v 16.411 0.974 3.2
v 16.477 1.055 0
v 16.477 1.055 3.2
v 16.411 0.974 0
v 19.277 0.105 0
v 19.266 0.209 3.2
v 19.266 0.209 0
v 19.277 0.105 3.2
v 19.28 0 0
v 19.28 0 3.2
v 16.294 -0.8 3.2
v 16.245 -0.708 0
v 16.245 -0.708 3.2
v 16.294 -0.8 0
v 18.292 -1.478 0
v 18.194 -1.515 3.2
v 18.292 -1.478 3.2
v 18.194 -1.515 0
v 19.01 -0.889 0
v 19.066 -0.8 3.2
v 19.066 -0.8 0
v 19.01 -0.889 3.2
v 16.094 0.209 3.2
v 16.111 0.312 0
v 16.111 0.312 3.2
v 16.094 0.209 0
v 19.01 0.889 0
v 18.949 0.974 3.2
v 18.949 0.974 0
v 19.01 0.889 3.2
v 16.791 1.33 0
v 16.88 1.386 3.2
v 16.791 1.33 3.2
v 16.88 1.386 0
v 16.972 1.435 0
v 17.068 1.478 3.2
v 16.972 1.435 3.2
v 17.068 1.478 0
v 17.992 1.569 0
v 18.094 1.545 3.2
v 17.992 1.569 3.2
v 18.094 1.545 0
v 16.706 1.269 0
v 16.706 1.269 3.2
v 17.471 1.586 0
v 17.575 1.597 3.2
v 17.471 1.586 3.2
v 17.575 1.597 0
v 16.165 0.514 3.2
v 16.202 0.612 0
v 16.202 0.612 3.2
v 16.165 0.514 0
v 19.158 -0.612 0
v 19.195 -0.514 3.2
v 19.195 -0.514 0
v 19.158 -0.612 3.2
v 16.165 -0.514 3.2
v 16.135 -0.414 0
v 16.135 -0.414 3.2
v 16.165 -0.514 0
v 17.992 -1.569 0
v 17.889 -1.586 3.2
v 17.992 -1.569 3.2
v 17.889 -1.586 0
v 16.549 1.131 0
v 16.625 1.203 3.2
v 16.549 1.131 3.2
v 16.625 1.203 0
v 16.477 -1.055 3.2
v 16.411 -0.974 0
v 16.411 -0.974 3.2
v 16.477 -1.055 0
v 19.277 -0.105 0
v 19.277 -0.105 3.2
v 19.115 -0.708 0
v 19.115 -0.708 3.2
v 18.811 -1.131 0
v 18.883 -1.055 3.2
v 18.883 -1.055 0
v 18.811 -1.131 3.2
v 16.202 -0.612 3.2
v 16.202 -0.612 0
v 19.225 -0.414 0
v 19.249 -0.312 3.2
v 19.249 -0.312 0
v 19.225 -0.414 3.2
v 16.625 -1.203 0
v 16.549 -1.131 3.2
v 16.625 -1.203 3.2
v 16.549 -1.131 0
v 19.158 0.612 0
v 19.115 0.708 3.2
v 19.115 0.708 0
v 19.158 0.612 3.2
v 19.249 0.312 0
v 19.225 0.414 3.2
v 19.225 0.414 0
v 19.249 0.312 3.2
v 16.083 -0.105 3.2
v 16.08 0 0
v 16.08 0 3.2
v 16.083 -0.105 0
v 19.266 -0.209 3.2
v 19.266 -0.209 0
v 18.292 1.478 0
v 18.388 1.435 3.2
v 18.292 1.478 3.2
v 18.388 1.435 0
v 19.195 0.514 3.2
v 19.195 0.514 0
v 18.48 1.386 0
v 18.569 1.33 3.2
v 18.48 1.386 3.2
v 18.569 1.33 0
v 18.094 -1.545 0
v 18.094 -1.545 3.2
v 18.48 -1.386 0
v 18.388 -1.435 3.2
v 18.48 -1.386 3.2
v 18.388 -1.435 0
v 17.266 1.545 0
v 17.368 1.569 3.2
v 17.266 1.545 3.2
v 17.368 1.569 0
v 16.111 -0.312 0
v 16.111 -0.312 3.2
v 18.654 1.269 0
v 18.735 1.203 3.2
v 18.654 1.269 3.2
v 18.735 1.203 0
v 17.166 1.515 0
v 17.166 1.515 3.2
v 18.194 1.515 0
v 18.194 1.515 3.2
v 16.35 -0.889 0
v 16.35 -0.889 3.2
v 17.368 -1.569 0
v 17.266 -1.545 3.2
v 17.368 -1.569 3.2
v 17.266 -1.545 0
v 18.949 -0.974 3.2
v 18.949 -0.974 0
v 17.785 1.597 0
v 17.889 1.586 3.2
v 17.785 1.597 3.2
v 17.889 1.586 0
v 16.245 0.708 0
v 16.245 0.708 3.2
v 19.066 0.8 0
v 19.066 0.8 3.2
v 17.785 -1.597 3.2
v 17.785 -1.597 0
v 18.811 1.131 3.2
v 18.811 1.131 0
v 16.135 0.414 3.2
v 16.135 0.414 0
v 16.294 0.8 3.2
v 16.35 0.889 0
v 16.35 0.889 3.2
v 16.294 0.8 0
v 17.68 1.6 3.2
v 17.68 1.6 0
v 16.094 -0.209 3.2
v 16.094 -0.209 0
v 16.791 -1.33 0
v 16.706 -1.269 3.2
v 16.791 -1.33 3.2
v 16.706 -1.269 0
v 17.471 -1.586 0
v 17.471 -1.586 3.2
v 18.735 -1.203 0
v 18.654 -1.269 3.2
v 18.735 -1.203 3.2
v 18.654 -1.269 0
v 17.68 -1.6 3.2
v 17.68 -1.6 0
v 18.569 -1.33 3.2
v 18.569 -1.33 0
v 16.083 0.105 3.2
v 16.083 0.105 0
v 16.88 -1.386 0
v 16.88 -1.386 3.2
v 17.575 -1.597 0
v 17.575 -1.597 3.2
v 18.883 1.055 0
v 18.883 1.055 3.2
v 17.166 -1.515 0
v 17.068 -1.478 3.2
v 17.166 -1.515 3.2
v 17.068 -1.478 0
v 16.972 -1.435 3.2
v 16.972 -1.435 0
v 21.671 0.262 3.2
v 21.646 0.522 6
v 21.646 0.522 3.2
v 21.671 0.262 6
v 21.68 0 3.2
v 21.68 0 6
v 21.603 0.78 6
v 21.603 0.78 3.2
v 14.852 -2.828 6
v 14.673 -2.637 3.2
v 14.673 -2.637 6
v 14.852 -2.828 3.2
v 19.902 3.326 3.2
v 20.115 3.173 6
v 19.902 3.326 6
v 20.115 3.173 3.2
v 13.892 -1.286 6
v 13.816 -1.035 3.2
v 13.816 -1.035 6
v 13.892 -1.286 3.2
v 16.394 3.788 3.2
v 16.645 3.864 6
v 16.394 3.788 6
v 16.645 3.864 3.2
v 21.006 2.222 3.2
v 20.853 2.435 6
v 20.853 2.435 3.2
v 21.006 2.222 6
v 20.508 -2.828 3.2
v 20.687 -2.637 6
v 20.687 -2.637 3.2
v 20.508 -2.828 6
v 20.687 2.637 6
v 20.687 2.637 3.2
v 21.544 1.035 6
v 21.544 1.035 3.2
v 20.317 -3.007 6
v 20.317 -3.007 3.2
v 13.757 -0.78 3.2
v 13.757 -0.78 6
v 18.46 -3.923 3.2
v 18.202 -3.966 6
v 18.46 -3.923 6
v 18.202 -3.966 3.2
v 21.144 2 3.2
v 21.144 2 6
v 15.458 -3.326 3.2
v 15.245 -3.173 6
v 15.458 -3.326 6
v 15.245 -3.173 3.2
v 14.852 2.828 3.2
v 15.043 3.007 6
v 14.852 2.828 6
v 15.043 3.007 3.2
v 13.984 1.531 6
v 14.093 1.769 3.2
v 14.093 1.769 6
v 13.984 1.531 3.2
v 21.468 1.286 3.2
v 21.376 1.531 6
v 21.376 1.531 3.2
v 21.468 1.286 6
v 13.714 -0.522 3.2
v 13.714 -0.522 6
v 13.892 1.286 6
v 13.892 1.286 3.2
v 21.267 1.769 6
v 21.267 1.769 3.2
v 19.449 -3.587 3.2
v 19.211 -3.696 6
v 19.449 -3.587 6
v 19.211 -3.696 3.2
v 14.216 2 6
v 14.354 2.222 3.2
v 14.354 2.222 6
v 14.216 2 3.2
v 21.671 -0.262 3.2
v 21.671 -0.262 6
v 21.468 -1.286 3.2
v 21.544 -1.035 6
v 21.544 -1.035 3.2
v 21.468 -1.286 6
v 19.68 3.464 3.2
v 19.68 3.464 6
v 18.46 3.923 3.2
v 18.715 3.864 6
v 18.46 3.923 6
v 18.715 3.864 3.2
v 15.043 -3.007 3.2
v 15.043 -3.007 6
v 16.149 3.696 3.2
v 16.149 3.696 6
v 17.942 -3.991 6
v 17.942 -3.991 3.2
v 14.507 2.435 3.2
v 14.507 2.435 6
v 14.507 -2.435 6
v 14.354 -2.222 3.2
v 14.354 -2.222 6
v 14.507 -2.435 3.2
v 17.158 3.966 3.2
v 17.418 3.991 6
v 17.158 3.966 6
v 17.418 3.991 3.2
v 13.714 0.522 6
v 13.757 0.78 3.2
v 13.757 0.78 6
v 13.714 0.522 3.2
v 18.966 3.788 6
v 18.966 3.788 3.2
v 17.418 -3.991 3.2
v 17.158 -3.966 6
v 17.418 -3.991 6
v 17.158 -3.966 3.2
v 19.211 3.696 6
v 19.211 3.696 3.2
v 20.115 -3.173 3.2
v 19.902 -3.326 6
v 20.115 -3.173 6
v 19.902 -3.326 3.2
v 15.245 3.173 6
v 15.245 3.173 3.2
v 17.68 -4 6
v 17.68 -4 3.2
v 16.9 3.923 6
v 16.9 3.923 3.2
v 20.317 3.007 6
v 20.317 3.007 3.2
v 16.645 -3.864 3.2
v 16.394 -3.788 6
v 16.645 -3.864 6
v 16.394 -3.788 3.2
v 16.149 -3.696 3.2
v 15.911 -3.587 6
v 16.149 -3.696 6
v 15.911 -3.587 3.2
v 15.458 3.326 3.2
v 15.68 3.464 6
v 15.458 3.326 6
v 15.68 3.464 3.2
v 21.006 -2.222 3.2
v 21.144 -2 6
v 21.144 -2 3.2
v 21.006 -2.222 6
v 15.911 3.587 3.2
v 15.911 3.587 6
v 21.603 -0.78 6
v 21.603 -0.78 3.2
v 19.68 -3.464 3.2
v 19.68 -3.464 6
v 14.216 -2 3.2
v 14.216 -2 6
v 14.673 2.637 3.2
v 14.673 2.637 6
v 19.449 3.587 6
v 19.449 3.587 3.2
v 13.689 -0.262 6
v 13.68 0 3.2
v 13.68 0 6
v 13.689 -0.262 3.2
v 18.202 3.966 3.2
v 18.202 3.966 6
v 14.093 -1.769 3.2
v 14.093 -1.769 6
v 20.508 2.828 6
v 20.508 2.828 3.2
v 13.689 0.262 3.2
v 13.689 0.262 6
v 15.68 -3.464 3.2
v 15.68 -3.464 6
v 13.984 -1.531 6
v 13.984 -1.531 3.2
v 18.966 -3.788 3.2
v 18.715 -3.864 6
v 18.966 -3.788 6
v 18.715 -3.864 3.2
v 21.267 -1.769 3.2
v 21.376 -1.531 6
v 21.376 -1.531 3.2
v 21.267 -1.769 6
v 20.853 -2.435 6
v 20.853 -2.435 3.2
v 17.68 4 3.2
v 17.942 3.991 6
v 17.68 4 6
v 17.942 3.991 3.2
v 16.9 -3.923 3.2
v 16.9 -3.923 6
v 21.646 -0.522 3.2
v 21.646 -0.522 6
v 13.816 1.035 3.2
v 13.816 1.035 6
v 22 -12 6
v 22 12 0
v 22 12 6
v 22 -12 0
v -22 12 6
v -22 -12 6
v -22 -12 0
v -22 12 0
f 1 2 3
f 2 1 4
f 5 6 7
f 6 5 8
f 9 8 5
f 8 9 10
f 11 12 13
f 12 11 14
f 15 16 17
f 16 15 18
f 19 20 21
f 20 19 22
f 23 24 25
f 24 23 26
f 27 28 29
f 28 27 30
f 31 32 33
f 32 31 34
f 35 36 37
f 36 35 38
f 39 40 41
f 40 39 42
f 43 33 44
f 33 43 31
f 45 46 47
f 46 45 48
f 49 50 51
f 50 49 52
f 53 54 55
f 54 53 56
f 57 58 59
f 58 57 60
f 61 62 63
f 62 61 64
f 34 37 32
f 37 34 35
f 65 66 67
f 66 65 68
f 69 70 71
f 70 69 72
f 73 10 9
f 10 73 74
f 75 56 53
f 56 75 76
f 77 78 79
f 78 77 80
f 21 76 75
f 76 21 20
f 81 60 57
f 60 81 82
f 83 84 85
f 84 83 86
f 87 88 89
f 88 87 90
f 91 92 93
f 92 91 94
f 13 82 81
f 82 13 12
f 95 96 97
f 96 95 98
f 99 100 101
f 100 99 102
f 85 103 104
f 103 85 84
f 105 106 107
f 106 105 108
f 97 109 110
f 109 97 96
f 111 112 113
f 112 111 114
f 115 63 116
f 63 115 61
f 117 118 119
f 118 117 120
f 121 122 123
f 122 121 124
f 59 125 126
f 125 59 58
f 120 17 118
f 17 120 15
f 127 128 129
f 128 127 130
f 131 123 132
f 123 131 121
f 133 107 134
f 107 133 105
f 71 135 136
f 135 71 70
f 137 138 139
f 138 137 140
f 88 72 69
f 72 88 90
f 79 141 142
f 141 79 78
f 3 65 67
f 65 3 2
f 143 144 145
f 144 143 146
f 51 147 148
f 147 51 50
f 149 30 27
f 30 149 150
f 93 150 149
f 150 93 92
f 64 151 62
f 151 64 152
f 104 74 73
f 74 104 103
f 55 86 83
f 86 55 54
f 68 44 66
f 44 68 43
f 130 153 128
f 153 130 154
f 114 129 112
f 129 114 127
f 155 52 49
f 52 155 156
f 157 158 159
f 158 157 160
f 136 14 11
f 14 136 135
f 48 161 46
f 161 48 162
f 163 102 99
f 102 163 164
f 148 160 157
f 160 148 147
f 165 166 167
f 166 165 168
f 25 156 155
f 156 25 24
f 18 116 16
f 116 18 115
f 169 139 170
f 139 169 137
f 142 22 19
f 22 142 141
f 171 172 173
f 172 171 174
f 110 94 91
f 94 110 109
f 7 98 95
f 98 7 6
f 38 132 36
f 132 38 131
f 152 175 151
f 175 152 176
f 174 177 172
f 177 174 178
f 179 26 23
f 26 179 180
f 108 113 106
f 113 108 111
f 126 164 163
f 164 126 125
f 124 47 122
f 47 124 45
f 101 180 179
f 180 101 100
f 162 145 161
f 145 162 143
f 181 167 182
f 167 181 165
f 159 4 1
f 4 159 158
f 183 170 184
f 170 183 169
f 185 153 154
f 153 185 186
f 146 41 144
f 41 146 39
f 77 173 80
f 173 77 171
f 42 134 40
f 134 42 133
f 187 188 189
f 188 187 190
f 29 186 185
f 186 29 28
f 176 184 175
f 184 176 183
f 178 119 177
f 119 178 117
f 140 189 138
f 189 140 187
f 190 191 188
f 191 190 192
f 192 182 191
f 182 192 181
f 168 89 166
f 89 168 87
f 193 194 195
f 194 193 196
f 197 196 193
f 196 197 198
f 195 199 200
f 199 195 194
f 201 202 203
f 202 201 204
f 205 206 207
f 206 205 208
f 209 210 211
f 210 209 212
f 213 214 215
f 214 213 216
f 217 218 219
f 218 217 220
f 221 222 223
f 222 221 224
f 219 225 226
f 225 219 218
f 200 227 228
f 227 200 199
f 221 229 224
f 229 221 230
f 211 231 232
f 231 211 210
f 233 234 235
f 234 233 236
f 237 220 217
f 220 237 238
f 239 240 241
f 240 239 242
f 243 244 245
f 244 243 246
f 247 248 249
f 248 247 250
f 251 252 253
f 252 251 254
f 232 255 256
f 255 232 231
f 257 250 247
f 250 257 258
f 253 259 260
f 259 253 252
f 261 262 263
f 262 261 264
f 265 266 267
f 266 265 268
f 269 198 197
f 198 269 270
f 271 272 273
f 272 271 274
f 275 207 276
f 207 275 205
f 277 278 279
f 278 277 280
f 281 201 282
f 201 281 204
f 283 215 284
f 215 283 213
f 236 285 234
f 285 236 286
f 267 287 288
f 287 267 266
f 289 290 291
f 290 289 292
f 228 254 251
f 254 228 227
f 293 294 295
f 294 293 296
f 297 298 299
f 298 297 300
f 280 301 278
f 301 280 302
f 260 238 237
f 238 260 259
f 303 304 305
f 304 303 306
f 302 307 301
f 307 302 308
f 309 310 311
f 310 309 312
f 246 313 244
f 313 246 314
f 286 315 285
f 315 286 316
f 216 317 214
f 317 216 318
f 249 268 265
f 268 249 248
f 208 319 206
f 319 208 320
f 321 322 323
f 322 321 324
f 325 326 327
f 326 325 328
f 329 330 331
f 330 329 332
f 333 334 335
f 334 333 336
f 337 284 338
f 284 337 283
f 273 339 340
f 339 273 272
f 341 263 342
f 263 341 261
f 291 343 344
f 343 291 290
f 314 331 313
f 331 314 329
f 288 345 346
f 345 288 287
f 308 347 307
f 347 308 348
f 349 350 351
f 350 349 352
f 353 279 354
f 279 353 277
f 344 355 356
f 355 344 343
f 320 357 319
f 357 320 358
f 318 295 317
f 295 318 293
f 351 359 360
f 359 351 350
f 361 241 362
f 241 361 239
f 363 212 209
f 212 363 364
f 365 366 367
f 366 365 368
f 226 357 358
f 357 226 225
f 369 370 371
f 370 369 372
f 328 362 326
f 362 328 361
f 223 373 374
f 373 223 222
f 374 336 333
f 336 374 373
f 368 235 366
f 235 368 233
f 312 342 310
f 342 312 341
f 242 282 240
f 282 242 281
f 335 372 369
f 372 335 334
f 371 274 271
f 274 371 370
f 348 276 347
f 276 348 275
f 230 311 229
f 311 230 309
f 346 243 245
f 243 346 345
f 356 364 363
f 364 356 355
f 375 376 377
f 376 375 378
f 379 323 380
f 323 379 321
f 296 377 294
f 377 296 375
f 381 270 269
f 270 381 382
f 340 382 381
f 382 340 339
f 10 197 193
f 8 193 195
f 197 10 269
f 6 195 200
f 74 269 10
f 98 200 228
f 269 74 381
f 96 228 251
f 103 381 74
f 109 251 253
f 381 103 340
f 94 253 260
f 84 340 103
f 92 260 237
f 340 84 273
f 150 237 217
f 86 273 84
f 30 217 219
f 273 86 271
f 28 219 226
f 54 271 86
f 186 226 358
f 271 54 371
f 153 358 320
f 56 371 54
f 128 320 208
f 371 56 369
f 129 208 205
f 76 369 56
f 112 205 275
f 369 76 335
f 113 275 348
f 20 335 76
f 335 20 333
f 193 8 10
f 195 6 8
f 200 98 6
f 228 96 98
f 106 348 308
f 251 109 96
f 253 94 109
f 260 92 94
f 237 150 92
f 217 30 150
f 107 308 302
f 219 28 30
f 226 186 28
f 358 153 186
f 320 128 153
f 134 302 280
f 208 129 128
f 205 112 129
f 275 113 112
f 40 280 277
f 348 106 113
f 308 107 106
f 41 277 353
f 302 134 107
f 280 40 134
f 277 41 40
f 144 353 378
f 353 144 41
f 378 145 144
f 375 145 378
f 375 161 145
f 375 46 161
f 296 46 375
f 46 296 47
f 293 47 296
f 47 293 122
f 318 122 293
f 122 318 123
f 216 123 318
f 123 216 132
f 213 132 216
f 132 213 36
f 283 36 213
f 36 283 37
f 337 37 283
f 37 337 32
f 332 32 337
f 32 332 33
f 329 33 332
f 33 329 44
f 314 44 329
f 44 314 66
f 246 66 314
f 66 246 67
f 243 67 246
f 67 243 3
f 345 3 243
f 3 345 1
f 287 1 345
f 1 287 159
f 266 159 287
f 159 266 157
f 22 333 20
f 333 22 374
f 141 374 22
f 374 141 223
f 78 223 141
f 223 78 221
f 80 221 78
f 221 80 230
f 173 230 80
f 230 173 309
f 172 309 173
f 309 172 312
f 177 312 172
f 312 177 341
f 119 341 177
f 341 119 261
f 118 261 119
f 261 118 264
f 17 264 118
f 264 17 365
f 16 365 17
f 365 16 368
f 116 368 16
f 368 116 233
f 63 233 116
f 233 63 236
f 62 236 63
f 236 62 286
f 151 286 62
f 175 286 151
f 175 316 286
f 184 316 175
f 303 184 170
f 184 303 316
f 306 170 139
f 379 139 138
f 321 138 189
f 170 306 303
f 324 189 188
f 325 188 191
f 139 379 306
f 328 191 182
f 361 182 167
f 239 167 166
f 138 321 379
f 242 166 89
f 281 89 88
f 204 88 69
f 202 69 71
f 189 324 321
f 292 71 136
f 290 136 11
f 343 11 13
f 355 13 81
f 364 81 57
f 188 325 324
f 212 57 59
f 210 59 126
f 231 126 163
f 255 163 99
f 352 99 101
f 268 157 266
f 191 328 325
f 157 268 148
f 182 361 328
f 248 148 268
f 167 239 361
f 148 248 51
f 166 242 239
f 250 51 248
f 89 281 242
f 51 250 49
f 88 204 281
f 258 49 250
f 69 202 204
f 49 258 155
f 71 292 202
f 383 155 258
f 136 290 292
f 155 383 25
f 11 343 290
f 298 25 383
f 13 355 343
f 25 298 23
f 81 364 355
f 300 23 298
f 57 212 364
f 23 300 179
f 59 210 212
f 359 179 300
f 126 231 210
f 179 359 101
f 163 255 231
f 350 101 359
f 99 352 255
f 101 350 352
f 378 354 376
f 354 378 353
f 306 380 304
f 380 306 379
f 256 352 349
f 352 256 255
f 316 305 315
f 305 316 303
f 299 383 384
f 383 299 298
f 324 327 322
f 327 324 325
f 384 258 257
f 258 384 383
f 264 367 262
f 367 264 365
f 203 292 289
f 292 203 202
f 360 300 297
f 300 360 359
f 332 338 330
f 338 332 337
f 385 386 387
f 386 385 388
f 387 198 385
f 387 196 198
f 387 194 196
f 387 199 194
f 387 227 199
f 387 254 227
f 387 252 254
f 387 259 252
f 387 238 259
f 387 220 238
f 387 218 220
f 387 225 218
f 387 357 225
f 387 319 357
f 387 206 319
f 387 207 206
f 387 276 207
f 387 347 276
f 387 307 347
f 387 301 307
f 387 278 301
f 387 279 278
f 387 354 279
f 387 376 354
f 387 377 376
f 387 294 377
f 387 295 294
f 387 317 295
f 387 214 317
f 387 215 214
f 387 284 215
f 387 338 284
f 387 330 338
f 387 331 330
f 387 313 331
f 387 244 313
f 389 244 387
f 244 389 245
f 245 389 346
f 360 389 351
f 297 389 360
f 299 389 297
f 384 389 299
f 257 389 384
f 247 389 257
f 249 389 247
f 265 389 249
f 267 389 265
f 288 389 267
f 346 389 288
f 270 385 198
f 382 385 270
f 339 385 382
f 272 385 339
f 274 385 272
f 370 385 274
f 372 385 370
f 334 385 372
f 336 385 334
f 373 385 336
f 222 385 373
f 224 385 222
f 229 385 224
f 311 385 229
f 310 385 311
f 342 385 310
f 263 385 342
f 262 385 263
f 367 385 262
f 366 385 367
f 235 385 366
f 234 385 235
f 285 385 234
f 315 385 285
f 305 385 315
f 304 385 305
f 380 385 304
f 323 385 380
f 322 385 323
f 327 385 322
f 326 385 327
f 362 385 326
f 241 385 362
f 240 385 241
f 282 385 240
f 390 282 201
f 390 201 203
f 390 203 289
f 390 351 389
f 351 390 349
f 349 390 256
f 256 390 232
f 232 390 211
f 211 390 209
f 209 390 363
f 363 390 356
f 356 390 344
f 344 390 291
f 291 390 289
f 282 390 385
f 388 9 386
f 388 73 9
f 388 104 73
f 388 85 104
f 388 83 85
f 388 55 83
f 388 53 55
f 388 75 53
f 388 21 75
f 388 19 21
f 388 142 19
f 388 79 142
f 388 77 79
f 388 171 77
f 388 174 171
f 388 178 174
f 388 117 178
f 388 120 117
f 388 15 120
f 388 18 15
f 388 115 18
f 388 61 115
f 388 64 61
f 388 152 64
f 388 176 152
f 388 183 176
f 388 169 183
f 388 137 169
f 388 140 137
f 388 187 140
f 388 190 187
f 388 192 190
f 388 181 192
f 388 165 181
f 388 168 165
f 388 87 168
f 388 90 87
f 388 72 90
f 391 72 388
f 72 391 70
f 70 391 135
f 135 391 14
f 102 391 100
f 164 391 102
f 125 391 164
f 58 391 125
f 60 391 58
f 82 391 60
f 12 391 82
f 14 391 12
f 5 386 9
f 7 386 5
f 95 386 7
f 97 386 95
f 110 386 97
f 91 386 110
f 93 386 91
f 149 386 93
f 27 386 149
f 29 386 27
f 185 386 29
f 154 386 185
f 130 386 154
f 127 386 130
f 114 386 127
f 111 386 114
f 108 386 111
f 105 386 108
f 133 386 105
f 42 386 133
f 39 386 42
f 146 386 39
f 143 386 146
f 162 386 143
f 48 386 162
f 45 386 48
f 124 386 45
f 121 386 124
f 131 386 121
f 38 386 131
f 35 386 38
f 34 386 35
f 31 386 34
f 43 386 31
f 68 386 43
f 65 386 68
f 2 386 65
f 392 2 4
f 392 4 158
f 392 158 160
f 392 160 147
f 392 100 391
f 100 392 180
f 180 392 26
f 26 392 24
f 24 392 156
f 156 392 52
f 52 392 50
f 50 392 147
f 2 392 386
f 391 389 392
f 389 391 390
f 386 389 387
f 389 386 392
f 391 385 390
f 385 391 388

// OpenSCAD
// Auto-generated from tests/data/feature_fixtures_manifest.json
// fixture: plate_counterbore_small_clearance
// fixture_type: plate
// description: Counterbore with very small radial clearance to the outer plate boundary.
$fn = 96;

plate_size = [44.000000, 24.000000, 6.000000];
plate_origin = [-22.000000, -12.000000, 0.000000];

module through_hole(center, diameter, height) {
  translate(center) cylinder(d=diameter, h=height, center=false);
}

module through_slot(start, end, width, height) {
  hull() {
    through_hole(start, width, height);
    through_hole(end, width, height);
  }
}

module counterbore_hole(center, through_d, bore_d, bore_depth, plate_thickness) {
  translate([center[0], center[1], -0.1])
    cylinder(d=through_d, h=plate_thickness + 0.2, center=false);
  translate([center[0], center[1], plate_thickness - bore_depth])
    cylinder(d=bore_d, h=bore_depth + 0.1, center=false);
}

difference() {
  translate(plate_origin) cube(plate_size);
  counterbore_hole([17.680000, 0.000000, 0.000000], 3.200000, 8.000000, 2.800000, 6.000000);  // counterbore_0
}
